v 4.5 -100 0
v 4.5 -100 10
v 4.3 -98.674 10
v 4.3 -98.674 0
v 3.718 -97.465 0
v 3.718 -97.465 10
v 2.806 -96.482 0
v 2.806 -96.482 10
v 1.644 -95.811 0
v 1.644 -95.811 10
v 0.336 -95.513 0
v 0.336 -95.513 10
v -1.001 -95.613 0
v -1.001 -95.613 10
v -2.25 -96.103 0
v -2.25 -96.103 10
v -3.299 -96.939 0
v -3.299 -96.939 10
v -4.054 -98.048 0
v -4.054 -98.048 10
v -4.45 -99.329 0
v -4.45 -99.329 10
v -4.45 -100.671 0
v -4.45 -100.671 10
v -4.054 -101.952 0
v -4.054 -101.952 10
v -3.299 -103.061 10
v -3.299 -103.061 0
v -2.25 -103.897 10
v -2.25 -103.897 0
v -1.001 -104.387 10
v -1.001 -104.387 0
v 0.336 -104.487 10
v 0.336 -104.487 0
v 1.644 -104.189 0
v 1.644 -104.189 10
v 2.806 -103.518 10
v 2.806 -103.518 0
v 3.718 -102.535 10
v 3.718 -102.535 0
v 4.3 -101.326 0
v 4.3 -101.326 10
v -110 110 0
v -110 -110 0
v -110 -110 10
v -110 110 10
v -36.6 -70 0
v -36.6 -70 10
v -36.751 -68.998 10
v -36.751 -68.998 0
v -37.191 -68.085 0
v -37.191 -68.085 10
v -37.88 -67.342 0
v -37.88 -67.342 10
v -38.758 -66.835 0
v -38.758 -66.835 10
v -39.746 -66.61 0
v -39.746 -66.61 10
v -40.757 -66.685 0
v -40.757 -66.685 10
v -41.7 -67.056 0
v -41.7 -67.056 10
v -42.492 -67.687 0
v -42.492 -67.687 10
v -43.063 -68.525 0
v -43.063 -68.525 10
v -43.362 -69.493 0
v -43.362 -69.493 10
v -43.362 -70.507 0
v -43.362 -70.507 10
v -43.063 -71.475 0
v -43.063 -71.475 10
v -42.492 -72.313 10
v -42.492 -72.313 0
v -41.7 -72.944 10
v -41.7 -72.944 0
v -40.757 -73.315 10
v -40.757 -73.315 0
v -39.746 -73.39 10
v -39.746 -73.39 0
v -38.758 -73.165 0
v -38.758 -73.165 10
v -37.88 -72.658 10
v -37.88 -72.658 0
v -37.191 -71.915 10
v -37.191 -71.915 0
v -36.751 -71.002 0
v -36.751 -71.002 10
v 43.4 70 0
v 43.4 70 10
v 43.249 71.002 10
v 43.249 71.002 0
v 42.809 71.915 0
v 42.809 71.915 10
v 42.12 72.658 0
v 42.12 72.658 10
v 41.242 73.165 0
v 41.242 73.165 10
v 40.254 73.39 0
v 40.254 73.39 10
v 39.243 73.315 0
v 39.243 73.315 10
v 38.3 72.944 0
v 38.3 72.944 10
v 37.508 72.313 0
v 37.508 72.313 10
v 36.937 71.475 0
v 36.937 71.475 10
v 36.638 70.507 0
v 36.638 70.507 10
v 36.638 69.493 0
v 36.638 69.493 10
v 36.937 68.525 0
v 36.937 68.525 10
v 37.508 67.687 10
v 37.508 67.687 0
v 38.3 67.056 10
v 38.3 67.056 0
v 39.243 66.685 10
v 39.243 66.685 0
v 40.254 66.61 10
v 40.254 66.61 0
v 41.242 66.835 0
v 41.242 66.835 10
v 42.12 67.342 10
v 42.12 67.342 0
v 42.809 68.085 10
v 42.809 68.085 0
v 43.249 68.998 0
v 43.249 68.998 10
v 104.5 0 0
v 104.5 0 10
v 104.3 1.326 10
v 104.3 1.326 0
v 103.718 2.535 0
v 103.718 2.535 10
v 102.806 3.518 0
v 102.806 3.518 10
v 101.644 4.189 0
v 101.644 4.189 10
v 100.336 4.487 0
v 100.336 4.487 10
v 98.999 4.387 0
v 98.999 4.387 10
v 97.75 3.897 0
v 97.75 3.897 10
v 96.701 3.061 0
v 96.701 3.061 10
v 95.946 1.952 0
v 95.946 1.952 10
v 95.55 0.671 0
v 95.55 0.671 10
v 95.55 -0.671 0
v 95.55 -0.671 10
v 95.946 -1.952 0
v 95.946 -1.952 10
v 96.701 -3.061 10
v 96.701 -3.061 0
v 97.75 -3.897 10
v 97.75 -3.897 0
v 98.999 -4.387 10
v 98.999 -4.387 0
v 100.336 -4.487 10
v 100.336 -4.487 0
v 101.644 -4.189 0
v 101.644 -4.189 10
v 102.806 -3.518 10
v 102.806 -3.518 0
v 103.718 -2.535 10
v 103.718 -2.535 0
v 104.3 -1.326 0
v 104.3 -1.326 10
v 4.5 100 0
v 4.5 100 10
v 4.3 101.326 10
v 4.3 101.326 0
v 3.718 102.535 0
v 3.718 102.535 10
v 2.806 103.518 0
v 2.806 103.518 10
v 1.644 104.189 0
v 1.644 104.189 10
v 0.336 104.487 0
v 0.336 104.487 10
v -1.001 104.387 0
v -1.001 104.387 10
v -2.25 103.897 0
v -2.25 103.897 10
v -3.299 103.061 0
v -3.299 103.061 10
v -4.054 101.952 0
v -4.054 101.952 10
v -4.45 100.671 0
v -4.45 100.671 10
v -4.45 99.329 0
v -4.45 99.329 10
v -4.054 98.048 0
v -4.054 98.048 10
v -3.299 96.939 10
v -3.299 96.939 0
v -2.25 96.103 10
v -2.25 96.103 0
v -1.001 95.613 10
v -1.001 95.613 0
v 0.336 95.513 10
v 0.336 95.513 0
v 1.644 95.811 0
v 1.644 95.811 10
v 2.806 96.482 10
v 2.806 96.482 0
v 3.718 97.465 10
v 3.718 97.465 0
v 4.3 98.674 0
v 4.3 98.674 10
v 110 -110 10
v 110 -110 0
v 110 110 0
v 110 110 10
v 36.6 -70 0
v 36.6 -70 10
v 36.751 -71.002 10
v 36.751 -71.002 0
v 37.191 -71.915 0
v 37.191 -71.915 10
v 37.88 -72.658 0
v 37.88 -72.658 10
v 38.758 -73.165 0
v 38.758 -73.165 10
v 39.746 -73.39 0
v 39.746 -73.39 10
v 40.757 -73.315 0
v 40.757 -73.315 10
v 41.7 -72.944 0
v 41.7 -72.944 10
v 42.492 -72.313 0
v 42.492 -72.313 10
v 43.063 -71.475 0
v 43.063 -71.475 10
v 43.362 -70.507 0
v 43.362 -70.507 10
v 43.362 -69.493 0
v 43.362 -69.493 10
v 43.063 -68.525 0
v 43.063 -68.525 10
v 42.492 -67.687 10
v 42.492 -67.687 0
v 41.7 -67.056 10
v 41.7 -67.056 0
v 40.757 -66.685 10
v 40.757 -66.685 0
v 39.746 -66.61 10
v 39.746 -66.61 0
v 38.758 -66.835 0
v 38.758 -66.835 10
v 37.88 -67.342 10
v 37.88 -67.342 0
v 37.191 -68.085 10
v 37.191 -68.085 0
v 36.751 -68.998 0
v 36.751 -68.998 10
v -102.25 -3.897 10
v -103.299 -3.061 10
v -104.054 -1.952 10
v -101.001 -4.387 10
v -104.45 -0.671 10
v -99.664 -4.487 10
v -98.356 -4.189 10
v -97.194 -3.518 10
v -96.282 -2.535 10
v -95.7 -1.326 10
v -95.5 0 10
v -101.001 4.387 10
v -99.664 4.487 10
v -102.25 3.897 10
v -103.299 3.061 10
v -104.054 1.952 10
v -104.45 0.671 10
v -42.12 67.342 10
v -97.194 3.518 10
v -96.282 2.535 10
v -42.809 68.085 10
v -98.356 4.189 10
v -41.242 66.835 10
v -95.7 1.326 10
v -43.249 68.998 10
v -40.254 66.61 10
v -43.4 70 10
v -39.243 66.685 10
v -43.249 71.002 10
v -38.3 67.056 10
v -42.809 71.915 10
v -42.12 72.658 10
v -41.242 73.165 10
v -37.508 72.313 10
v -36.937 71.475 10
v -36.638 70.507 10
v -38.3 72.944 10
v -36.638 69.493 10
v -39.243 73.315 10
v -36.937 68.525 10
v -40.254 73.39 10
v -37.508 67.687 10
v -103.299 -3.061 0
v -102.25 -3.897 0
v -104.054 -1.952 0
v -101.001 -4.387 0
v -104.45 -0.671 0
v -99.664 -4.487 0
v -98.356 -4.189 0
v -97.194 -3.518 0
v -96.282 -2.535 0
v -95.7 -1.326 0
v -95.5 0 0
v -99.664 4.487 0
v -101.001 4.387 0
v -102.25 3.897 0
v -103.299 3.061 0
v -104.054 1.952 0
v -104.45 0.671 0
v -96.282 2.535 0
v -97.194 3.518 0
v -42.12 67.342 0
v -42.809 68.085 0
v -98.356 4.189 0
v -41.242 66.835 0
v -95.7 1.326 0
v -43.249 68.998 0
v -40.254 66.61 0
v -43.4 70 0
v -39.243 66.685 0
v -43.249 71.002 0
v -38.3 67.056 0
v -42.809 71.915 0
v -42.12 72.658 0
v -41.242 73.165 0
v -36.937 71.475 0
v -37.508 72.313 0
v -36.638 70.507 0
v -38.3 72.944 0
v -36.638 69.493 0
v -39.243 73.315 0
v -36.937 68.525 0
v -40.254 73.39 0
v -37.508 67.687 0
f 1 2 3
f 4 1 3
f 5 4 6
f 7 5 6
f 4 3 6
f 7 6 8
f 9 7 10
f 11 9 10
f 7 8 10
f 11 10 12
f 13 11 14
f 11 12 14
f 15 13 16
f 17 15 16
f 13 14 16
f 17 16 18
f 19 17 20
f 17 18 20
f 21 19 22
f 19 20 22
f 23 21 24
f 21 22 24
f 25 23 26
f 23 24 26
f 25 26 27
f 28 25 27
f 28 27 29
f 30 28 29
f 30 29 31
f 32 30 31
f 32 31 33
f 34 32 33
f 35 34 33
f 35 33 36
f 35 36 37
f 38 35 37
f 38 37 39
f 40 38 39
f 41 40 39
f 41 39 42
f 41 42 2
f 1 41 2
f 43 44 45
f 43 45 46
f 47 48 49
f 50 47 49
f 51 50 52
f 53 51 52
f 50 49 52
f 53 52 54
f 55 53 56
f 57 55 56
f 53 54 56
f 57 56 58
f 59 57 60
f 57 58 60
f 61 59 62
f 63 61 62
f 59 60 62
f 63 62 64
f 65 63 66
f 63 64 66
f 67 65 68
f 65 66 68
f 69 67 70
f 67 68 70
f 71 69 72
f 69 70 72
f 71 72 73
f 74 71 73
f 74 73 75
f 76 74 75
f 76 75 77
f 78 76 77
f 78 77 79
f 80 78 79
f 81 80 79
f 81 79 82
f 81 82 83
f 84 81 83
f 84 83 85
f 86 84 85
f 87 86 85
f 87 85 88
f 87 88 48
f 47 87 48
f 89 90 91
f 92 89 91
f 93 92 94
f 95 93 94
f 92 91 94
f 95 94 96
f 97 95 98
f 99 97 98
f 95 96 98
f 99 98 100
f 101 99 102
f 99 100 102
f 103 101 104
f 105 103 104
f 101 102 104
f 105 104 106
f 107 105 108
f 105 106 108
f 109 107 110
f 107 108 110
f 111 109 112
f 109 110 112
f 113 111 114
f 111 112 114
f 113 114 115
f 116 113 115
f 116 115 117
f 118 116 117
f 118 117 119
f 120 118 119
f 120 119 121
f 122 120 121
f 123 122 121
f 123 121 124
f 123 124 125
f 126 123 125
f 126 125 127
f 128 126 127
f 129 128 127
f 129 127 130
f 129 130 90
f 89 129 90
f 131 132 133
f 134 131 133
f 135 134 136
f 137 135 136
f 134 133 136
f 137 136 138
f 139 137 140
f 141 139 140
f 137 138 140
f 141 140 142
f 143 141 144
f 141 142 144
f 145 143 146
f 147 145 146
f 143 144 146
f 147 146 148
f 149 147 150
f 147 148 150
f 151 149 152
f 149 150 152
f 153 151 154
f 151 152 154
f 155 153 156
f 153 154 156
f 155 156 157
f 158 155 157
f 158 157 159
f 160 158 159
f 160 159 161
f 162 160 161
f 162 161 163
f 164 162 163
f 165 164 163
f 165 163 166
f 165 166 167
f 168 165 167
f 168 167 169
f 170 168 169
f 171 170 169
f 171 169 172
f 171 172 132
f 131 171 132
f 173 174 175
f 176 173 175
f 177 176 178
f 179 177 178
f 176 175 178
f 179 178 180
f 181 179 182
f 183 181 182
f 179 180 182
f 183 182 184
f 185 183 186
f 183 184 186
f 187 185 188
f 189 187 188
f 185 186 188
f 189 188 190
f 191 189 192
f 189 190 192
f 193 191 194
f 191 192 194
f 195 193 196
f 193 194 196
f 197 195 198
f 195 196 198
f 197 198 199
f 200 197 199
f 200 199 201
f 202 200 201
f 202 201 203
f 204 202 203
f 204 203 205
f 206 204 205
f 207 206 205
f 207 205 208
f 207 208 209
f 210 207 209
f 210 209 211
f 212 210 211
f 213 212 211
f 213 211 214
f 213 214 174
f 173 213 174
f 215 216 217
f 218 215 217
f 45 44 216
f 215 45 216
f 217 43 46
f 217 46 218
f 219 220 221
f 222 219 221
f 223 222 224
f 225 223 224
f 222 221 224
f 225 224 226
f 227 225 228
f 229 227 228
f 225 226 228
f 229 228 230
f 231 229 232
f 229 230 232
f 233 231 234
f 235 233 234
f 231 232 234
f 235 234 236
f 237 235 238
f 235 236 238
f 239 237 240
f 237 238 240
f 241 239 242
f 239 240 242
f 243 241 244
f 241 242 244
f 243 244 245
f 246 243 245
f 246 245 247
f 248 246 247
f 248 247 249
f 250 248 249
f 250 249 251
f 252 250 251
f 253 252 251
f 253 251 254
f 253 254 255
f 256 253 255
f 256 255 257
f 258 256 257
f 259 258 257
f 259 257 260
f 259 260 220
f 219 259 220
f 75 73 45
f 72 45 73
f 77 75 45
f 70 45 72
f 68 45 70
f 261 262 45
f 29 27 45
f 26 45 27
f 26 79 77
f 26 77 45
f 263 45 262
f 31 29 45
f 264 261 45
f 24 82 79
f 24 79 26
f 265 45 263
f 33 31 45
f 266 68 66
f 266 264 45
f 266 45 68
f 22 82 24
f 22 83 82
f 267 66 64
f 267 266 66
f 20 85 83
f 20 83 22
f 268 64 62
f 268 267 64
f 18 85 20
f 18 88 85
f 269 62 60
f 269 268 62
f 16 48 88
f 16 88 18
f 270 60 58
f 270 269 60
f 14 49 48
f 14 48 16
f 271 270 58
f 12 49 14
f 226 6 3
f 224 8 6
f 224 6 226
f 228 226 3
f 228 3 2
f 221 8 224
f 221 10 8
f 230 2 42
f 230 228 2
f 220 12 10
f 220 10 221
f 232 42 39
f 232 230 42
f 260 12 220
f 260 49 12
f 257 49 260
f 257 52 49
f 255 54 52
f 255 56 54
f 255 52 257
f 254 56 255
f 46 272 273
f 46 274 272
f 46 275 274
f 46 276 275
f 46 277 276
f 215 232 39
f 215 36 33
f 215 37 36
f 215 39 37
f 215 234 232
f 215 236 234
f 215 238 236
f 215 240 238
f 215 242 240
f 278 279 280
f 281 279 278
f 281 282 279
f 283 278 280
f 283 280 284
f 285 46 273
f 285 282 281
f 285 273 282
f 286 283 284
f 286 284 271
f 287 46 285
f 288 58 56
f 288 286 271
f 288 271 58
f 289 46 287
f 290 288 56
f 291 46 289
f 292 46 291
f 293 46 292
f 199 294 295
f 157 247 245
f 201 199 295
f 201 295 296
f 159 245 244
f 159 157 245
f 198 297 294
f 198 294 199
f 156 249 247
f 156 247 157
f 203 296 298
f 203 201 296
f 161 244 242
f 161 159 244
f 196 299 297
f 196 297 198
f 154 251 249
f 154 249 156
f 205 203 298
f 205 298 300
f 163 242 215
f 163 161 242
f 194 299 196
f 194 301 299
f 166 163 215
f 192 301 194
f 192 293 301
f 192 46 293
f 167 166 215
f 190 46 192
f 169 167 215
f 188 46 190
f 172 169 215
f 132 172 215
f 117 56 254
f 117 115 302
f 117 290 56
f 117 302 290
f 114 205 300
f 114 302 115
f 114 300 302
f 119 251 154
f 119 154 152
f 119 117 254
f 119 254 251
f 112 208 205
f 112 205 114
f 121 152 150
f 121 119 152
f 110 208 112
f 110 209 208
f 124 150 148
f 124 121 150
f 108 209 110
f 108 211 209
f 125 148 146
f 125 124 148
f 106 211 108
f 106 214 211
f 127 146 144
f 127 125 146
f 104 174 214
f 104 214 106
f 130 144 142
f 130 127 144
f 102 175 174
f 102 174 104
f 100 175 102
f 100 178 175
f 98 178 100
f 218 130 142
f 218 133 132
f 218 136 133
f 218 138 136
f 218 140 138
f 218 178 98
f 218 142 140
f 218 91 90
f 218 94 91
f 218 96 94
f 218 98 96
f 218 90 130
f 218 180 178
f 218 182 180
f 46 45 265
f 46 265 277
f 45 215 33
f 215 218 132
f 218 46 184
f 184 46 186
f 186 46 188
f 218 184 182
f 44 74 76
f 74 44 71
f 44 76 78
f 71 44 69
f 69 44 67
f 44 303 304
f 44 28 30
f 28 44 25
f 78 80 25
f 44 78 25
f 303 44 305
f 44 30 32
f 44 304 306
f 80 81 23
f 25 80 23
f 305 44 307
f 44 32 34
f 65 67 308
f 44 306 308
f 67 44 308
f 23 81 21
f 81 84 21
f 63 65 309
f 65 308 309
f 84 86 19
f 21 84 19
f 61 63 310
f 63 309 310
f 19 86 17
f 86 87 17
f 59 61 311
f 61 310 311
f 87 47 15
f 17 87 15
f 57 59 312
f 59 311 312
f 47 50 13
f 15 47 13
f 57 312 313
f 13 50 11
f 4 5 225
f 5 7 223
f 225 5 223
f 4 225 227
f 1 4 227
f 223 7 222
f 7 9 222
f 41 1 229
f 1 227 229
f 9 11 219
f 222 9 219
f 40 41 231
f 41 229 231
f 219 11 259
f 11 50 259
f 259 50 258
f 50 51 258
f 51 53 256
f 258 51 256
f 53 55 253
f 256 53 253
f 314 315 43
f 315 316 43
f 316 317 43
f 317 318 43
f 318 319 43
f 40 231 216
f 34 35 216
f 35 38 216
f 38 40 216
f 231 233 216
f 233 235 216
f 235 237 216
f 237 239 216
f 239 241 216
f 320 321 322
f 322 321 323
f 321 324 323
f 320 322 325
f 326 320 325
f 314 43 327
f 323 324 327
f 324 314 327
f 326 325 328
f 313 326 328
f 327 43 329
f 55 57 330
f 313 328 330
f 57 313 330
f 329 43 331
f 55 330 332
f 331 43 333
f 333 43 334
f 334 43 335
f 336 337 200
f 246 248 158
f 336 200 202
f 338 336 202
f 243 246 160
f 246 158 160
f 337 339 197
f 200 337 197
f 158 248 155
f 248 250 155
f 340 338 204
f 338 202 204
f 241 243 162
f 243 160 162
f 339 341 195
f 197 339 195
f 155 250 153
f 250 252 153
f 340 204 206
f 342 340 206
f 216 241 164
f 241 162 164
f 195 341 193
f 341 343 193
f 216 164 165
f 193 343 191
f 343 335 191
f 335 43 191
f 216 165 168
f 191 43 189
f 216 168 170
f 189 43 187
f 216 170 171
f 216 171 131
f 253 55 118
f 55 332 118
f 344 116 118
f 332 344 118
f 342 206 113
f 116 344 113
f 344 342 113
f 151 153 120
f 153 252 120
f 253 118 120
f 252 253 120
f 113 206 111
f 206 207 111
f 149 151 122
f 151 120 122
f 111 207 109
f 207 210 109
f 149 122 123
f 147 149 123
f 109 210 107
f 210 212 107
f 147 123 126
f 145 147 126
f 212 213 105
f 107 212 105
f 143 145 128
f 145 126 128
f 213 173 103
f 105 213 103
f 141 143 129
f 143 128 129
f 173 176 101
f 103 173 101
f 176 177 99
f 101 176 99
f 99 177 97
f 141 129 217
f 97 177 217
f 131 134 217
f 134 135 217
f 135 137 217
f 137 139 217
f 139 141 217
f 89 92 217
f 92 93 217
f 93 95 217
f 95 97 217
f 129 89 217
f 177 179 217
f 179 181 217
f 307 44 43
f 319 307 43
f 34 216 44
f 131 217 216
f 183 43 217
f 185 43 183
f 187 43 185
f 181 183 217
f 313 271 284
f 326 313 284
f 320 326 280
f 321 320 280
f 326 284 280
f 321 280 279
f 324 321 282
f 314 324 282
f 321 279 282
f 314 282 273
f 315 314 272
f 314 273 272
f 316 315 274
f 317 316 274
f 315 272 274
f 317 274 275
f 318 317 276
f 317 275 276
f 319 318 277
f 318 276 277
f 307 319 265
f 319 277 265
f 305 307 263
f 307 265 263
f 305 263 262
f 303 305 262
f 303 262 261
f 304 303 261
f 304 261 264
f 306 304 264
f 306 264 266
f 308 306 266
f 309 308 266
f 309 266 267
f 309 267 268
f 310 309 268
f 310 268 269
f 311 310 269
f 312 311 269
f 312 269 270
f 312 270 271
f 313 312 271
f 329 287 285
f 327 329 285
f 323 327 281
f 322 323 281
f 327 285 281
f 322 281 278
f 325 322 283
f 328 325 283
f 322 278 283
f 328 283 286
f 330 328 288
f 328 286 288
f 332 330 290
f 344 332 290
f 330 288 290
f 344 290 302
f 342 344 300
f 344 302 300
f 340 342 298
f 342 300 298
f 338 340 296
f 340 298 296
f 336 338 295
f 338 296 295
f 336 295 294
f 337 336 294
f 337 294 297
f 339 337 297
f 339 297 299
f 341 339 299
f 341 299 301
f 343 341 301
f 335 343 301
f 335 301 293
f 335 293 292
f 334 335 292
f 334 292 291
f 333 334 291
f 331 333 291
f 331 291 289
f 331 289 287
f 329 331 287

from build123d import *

# Parameters (mm, degrees)
SKIZZE1_W                       = 220
SKIZZE1_H                       = 220
AUFSATZ_LINEAR_AUSTRAGEN1_DEPTH = 10
SKIZZE3_R                       = 4.5
SCHNITT_LINEAR_AUSTRAGEN1_DEPTH = 156.884572681
SKIZZE4_R                       = 3.4
SCHNITT_LINEAR_AUSTRAGEN2_DEPTH = 156.884572681


with BuildPart() as part:
    # Skizze1 → Aufsatz-Linear austragen1 (new body)
    with BuildSketch(Plane.XY):
        Rectangle(SKIZZE1_W, SKIZZE1_H)
    extrude(amount=AUFSATZ_LINEAR_AUSTRAGEN1_DEPTH)

    # Skizze3 → Schnitt-Linear austragen1 (cut, through all)
    with BuildSketch(Plane.XY.offset(10)):
        with Locations((100, 0)):
            Circle(SKIZZE3_R)
        with Locations((0, -100)):
            Circle(SKIZZE3_R)
        with Locations((-100, 0)):
            Circle(SKIZZE3_R)
        with Locations((0, 100)):
            Circle(SKIZZE3_R)
    extrude(amount=-SCHNITT_LINEAR_AUSTRAGEN1_DEPTH, mode=Mode.SUBTRACT)

    # Skizze4 → Schnitt-Linear austragen2 (cut, through all)
    with BuildSketch(Plane.XY.offset(10)):
        with Locations((40, 70)):
            Circle(SKIZZE4_R)
        with Locations(Location((-40, 70, 0), (0, 0, 180))):
            Circle(SKIZZE4_R)
        with Locations(Location((40, -70, 0), (0, 0, 180))):
            Circle(SKIZZE4_R)
        with Locations((-40, -70)):
            Circle(SKIZZE4_R)
    extrude(amount=-SCHNITT_LINEAR_AUSTRAGEN2_DEPTH, mode=Mode.SUBTRACT)


solid = part.part
